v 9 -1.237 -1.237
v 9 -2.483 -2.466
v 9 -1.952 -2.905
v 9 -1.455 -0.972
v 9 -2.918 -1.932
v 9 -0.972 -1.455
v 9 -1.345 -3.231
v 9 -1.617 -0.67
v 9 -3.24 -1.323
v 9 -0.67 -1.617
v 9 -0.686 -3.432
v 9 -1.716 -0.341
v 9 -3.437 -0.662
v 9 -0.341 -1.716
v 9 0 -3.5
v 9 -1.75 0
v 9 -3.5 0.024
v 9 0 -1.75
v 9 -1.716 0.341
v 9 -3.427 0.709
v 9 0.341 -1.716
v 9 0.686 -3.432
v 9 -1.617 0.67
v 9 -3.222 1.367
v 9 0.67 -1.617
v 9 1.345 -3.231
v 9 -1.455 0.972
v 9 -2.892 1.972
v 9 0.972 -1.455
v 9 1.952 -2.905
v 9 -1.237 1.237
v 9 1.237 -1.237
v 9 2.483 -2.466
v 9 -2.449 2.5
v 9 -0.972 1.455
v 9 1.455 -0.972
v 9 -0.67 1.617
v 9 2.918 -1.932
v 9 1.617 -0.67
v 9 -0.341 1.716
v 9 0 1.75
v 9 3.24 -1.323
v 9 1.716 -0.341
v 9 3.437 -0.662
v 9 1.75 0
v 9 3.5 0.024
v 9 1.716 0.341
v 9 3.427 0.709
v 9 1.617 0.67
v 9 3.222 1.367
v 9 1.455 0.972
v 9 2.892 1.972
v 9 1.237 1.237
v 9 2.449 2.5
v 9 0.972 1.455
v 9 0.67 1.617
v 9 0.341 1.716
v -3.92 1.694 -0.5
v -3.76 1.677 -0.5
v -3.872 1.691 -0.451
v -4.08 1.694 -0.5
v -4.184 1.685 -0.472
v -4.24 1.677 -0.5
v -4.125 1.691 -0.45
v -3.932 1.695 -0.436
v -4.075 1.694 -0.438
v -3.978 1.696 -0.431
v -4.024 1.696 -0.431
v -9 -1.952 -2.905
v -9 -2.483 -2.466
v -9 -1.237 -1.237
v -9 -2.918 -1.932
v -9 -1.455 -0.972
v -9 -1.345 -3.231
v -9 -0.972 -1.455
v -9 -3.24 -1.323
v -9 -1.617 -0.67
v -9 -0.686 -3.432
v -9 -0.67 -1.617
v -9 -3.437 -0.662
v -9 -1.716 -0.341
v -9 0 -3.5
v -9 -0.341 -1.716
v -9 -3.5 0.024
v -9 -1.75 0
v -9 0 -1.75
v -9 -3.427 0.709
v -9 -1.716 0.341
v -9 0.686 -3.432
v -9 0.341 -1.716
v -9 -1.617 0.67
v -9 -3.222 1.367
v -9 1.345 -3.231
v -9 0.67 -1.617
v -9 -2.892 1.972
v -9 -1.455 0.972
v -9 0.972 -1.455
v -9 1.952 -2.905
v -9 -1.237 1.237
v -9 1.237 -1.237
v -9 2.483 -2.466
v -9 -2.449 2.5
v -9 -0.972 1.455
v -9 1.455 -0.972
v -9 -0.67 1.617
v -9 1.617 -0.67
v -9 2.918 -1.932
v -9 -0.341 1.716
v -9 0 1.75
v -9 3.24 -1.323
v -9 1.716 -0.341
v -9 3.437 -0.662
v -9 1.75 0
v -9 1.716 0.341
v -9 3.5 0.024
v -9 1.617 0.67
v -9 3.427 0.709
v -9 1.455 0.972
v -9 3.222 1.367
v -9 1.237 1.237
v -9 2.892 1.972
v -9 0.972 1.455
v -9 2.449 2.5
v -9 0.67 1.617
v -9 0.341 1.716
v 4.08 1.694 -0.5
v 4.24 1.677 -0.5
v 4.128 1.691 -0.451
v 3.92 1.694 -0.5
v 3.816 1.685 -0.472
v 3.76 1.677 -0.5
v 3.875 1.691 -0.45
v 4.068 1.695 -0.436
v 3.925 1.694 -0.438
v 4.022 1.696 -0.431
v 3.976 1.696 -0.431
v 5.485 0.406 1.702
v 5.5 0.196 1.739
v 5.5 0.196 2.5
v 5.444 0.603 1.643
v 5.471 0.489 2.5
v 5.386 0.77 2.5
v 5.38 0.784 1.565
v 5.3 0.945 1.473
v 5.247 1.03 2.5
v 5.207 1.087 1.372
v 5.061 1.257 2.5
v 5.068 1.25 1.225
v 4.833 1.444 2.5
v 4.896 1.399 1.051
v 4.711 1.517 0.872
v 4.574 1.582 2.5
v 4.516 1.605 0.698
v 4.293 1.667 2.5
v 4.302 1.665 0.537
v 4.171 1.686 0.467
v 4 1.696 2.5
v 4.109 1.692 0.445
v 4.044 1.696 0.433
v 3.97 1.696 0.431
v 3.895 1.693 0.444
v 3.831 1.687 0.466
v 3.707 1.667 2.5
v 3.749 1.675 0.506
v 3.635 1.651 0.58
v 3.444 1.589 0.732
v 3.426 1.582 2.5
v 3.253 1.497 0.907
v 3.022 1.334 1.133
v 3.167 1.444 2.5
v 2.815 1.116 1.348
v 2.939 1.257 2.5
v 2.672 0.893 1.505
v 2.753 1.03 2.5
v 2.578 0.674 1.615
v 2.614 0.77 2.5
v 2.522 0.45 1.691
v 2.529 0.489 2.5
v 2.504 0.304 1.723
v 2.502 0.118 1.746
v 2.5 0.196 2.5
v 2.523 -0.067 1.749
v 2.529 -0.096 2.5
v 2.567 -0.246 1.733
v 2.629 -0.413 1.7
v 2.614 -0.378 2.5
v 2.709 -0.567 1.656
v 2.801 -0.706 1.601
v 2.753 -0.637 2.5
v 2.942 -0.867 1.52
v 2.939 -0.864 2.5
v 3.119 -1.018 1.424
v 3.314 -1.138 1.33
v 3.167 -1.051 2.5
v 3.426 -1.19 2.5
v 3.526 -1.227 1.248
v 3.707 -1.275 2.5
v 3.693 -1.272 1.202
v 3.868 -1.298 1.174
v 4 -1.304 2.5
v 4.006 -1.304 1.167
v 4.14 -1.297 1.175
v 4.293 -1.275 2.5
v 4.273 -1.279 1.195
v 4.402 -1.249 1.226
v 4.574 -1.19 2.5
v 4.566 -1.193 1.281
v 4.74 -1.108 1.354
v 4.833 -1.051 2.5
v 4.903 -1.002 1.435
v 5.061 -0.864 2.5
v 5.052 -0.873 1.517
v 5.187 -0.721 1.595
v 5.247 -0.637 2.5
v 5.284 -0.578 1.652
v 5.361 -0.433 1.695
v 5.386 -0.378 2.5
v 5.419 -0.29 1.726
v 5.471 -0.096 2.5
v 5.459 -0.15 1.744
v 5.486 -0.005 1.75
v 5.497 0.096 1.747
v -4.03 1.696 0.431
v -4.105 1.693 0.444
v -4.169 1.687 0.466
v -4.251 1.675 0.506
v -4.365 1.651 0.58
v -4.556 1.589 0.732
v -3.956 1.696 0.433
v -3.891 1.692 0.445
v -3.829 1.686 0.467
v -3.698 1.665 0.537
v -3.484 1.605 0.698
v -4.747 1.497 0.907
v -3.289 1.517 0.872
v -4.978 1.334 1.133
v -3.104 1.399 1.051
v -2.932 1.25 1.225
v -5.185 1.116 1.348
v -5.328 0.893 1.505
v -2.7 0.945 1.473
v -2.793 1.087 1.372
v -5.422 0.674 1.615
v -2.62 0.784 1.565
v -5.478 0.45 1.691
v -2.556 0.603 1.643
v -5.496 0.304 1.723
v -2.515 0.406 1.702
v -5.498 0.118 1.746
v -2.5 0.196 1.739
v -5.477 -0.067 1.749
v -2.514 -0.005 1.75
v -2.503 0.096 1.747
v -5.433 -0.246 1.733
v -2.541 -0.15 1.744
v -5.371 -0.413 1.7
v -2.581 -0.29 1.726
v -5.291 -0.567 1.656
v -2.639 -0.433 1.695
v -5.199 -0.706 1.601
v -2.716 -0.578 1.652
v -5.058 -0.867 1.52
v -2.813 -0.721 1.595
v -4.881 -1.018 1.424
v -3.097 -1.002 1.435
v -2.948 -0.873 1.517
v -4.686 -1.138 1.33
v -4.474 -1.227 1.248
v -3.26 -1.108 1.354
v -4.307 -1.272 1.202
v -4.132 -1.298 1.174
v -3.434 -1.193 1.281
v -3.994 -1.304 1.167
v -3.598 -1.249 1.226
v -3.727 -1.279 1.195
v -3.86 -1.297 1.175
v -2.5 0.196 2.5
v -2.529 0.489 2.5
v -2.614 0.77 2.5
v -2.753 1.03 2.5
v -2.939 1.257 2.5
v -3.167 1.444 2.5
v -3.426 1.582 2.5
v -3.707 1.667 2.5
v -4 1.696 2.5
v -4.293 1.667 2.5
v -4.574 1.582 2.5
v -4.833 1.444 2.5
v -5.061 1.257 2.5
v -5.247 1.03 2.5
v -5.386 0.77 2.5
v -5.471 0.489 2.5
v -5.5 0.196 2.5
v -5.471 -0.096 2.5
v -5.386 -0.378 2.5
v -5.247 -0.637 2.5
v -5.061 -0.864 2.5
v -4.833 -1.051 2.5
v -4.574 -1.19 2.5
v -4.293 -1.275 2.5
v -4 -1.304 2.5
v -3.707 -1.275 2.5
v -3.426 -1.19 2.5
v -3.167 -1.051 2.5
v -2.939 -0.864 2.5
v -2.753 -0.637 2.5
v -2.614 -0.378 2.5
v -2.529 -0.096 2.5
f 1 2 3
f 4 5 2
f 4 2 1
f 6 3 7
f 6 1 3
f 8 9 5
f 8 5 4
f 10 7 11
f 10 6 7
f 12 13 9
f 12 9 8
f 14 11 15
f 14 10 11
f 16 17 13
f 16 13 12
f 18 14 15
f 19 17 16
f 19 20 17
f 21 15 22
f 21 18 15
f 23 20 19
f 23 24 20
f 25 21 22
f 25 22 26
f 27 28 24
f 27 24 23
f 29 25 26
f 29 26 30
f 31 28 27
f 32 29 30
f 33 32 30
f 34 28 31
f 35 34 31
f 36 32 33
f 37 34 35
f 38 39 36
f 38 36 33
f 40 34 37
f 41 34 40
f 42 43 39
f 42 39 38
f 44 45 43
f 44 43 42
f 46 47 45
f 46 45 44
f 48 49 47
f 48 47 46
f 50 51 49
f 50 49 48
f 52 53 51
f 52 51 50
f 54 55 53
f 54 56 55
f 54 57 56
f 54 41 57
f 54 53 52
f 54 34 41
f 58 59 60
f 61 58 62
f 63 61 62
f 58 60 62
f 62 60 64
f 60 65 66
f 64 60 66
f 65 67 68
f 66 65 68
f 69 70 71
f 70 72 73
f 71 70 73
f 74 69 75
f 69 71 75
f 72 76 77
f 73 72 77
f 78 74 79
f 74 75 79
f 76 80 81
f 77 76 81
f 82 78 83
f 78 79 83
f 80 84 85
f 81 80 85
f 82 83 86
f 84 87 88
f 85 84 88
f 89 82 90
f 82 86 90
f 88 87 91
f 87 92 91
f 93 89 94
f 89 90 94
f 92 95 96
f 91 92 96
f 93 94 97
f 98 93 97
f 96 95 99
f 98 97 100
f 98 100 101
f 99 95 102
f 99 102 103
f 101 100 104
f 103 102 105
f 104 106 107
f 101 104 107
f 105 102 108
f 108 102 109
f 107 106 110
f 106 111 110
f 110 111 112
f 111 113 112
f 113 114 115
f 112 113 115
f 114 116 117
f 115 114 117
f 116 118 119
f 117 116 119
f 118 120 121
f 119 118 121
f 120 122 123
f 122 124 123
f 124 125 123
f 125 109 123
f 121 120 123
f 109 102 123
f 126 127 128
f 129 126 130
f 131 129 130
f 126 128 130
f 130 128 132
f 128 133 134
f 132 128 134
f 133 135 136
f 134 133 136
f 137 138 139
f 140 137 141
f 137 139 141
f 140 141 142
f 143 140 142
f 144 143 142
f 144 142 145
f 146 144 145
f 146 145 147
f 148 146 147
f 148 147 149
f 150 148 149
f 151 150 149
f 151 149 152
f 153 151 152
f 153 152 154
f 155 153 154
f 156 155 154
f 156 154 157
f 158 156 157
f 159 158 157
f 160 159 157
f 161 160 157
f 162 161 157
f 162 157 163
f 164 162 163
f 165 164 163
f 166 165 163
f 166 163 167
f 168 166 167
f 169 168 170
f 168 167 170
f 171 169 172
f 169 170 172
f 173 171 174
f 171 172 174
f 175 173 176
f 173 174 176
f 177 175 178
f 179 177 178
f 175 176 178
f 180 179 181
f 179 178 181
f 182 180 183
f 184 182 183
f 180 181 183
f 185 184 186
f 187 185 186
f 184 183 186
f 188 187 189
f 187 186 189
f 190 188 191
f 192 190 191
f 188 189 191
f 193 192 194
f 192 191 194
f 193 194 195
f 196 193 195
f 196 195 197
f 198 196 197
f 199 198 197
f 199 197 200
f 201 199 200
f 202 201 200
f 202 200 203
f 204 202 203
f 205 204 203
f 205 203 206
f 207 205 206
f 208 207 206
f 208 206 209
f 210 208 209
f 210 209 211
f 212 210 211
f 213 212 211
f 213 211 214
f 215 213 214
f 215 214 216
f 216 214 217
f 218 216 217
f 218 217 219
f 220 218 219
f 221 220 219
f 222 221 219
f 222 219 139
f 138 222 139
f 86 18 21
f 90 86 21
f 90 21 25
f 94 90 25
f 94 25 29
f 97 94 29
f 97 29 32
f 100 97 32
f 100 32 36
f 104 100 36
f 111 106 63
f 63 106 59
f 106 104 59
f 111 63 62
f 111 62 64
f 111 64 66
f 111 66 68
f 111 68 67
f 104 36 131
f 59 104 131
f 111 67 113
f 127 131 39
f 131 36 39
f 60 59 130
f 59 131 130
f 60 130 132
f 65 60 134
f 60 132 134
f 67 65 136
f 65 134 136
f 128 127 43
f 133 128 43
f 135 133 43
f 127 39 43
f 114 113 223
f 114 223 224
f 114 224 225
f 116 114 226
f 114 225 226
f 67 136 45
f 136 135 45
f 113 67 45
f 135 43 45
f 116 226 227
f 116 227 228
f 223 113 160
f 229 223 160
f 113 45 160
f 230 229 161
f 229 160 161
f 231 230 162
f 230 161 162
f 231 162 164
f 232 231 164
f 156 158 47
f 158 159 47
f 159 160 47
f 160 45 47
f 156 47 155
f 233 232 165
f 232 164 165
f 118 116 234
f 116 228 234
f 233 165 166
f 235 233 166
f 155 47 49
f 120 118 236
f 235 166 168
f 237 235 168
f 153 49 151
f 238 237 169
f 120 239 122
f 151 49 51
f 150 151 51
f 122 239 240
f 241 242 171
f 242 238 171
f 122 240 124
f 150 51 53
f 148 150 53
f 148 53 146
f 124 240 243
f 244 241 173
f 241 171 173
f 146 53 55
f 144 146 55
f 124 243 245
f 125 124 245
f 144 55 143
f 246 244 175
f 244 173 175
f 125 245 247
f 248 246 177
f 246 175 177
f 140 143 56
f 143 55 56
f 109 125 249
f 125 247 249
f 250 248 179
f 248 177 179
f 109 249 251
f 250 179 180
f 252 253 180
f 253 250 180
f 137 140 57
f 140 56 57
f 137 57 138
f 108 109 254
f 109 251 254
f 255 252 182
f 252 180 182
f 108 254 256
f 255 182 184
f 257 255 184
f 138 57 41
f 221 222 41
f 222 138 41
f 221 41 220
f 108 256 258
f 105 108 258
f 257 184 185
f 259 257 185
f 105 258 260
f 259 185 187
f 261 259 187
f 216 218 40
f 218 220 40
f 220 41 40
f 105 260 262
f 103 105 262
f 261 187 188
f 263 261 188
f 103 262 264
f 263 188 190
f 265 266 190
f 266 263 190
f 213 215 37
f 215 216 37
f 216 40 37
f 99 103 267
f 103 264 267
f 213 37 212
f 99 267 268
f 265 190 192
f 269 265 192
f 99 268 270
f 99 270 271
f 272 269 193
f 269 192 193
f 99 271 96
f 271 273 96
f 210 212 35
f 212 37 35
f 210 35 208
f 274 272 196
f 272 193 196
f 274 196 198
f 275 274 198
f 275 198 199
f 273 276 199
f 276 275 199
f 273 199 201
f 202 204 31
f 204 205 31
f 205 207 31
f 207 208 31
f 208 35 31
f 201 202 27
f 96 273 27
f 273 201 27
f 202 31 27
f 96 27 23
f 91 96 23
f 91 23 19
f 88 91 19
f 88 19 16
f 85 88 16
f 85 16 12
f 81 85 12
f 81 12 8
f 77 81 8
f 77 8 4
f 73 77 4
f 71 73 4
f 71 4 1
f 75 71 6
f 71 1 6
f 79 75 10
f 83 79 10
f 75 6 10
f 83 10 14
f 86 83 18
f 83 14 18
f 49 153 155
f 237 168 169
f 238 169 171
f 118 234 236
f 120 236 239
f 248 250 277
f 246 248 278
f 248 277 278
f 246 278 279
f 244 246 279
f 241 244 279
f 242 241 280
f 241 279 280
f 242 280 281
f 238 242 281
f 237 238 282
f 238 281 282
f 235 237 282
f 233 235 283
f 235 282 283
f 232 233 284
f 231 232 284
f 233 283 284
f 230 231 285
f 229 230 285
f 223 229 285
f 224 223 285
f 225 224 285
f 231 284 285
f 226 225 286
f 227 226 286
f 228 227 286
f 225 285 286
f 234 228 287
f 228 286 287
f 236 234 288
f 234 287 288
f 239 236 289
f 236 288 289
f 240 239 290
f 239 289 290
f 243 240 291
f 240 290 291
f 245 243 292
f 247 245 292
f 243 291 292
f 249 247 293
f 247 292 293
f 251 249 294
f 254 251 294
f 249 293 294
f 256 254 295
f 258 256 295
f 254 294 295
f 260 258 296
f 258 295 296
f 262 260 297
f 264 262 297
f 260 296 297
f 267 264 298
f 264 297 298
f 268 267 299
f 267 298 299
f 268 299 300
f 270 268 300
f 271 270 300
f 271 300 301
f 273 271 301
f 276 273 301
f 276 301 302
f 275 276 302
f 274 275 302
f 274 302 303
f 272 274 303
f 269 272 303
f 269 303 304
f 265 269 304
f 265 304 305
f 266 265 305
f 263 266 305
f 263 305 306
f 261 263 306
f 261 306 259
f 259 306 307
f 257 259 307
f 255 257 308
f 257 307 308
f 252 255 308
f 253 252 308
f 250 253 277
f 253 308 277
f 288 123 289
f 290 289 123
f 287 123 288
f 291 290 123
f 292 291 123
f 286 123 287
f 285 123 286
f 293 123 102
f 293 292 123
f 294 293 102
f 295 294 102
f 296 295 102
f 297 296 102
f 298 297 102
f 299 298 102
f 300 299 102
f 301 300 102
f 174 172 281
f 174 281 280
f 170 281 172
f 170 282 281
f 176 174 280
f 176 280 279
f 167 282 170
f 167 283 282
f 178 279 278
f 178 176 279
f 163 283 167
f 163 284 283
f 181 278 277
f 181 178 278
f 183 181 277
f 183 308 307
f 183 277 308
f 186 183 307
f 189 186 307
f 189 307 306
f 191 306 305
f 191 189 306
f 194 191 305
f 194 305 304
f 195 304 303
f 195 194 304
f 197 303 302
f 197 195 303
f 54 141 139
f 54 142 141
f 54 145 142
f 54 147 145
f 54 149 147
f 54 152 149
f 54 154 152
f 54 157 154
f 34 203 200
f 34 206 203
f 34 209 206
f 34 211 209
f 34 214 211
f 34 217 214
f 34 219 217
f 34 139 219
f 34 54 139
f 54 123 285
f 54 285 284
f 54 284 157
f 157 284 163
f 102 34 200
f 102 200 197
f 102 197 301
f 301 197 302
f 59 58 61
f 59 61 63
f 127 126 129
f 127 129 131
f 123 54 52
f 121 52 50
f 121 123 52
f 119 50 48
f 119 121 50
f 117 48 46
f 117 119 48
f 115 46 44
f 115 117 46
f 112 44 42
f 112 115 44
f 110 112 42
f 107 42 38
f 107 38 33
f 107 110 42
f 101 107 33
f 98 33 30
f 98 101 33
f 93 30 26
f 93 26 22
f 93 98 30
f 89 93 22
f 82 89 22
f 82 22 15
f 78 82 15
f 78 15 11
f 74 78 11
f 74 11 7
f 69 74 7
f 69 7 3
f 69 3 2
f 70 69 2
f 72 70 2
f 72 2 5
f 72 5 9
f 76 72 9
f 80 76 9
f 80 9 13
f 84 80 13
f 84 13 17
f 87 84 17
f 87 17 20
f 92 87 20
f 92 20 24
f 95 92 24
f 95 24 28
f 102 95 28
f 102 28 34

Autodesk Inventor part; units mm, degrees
ref_plane "YZ Plane" through (0, 0, 0) normal (1, 0, 0) x (0, 1, 0)
ref_plane "XZ Plane" through (0, 0, 0) normal (0, 1, 0) x (-1, 0, 0)
ref_plane "XY Plane" through (0, 0, 0) normal (0, 0, 1) x (1, 0, 0)
sketch "スケッチ1" plane through (0, 0, 0) normal (1, 0, 0) x (0, 1, 0)
  circle A0 centre (0, 0) radius 3.5
  dimension "d0" = 7
extrude "押し出し1" add sketch "スケッチ1" along normal mid plane 18
sketch "スケッチ2" plane through (9, 0, 0) normal (1, 0, 0) x (0, 0, -1)
  circle A0 centre (0, 0) radius 1.75
  dimension "d3" = 3.5
extrude "押し出し2" cut sketch "スケッチ2" against normal through all
sketch "スケッチ3" plane through (9, 0, 0) normal (1, 0, 0) x (0, 0, -1)
  line L0 (-4.5, 4.5039) -> (-2.5, 4.5039)
  line L1 (-2.5, 4.5039) -> (-2.5, -4.5039)
  line L2 (-2.5, -4.5039) -> (-4.5, -4.5039)
  line L3 (-4.5, -4.5039) -> (-4.5, 4.5039)
  circle A0 centre (0, 0) radius 3.5 projected
  line L4 (-4.5, 4.5039) -> (-2.5, -4.5039) construction
  line L5 (-2.5, 4.5039) -> (-4.5, -4.5039) construction
  point P0 (-3.5, 0)
extrude "押し出し3" cut sketch "スケッチ3" against normal through all contours L0 L1 A0 L2 L3 | L1 A0 picked at (-2.8262, -0.1289)
sketch "スケッチ5" plane through (9, -2.4495, 2.5) normal (0, 0, 1) x (1, 0, 0)
  circle A0 centre (-13, 2.6458) radius 1.5
  line L0 (-9, 2.4495) -> (-9, 9.8667) construction
  circle A1 centre (-5, 2.6458) radius 1.5
  dimension "d10" = 3
extrude "押し出し4" cut sketch "スケッチ5" against normal blind 3
thread "ねじ1" size "M3x0.5" class "6H" standard "ANSI Metric M Profile" full length
thread "ねじ2" size "M3x0.5" class "6H" standard "ANSI Metric M Profile" full length
properties part number "attachment2"
